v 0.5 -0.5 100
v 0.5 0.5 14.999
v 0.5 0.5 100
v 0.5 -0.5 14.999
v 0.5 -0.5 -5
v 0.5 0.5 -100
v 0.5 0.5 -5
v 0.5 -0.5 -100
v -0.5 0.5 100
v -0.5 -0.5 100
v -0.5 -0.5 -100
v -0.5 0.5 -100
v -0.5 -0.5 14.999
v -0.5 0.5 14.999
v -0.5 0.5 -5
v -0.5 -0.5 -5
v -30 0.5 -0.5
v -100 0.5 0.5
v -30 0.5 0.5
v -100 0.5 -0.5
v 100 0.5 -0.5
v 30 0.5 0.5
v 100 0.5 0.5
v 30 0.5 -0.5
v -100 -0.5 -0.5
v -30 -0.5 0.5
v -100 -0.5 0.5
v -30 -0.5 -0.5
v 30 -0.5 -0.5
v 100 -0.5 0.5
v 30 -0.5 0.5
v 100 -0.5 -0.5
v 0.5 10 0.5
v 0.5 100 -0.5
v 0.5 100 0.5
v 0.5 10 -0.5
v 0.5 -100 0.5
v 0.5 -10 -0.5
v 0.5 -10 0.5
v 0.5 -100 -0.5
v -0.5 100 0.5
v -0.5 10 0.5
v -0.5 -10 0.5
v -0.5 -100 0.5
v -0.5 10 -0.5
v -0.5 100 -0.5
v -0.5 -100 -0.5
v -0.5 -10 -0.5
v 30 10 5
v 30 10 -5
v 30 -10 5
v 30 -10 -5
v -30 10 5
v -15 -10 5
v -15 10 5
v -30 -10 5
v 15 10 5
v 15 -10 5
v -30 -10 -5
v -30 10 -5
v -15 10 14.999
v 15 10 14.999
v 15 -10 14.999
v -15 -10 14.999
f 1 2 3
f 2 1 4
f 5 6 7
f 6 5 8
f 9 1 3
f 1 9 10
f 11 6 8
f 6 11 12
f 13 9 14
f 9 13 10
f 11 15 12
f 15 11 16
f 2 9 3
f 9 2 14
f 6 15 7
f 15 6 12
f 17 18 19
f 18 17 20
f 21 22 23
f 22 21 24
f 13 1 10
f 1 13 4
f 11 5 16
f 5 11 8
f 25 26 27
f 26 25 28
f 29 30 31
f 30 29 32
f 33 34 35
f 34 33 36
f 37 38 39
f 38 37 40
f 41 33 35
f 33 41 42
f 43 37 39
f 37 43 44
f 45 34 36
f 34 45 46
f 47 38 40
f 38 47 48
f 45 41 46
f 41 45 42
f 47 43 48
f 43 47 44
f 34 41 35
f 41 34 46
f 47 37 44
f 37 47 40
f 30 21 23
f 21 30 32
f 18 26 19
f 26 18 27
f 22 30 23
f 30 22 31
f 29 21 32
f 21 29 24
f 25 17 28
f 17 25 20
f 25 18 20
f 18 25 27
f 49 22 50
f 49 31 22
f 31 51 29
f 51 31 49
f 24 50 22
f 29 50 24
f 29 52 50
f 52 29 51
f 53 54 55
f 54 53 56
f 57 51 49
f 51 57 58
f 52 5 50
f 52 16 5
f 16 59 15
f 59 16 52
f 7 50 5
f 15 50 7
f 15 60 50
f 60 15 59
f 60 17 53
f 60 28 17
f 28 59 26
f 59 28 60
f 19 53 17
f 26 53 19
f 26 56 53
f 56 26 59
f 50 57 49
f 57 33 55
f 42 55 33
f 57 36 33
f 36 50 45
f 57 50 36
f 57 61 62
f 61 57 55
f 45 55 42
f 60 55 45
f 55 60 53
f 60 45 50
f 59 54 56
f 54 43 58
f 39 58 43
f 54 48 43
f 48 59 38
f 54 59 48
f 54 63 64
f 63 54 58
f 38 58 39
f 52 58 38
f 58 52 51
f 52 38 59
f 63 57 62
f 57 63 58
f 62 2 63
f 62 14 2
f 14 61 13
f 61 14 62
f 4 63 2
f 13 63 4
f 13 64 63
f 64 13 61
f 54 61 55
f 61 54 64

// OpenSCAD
// axis
cube([1,1,200],center=true);
cube([1,200,1],center=true);
cube([200,1,1],center=true);

cube([60,20,10],center=true);

translate([0,0,10 - 0.001])
    cube([30,20,10],center=true);
